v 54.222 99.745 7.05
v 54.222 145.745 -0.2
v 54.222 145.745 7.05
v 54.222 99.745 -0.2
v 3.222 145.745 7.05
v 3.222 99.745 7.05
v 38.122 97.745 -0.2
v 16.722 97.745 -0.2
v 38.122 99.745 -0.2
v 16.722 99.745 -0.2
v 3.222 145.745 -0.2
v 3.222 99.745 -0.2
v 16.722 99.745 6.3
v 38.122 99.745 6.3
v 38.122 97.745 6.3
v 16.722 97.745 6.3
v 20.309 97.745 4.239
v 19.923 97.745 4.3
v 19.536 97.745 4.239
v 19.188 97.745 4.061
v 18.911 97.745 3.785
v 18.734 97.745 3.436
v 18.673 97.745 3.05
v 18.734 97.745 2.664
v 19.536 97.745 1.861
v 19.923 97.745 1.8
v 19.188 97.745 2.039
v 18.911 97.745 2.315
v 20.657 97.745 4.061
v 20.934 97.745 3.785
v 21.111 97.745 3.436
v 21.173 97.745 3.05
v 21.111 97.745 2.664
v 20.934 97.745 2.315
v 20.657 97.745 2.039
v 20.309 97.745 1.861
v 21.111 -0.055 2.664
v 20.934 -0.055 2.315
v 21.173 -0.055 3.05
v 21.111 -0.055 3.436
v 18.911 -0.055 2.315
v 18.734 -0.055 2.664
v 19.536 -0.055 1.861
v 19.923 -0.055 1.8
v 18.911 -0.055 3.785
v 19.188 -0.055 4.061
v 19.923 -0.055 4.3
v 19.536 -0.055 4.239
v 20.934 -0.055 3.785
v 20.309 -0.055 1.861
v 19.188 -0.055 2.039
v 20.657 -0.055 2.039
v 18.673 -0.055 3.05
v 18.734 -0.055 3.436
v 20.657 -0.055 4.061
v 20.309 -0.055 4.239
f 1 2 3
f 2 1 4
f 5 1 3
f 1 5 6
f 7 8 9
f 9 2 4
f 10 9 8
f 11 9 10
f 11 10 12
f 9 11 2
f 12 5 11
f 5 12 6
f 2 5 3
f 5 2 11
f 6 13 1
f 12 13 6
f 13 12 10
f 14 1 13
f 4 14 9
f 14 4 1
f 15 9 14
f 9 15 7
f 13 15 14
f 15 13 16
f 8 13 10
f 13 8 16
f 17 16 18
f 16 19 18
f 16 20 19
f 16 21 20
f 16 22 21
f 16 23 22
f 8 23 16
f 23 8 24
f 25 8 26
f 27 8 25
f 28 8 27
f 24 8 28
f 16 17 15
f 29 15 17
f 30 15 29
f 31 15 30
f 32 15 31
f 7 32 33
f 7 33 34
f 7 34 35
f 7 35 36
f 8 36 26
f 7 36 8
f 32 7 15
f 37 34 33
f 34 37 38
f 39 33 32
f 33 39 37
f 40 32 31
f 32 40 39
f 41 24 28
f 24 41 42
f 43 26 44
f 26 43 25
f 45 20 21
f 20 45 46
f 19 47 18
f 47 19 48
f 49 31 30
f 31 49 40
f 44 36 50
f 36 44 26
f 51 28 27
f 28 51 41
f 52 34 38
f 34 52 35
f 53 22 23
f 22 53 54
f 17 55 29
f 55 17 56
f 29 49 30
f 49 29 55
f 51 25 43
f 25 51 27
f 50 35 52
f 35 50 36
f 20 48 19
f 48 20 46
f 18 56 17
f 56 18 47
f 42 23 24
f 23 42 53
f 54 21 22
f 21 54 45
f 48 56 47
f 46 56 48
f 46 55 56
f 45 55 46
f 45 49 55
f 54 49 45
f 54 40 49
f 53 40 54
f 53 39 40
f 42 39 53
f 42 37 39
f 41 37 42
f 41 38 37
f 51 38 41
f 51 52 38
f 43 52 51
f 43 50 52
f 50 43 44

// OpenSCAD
$fn = 60;

board_w = 43.0;
board_h = 38.0;
board_clearance = 1.1; 

usb_in_y_original = 125.73;
rgb_in_y_original = 114.3;

// --- ORIGINAL STANDOFFS ---
orig_h1 = [13.46, 140.34]; 
orig_h2 = [50.55, 140.46]; 
orig_h3 = [50.42, 108.59]; 
orig_h4 = [13.46, 108.59]; 

board_center_x = (orig_h1[0] + orig_h2[0] + orig_h3[0] + orig_h4[0]) / 4;
board_center_y = (orig_h1[1] + orig_h2[1] + orig_h3[1] + orig_h4[1]) / 4;

// --- ADJUSTED STANDOFFS ---
h1 = [orig_h1[0] - 5.0, orig_h1[1]]; 
h2 = [orig_h2[0] - 1.0, orig_h2[1]]; 
h3 = [orig_h3[0] - 1.0, orig_h3[1]]; 
h4 = [orig_h4[0] - 5.0, orig_h4[1]]; 

case_width = board_w + board_clearance;
case_length = board_h + board_clearance;

front_extension = 5.0; 
case_min_x = board_center_x - (case_width / 2) - front_extension; 
case_max_x = board_center_x + (case_width / 2); 
case_min_y = board_center_y - (case_length / 2); 
case_max_y = board_center_y + (case_length / 2); 

wall_thickness = 1.5; 
base_thickness = 2.0; 
standoff_h = 2.5; 
nominal_standoff_h = 2.5; 
pcb_thickness = 1.6;

usb_center_below_pcb = 1.6; 
usb_z = base_thickness + nominal_standoff_h - usb_center_below_pcb; 
total_internal_height = nominal_standoff_h + pcb_thickness; 

// Flip coordinates to match the mirrored standoffs
usb_in_y_flipped = board_center_y - (usb_in_y_original - board_center_y);
rgb_in_y_flipped = board_center_y - (rgb_in_y_original - board_center_y);

// LED sits on the downward-facing PCB. Center of a ~2mm LED is ~1mm below PCB surface.
rgb_z = base_thickness + nominal_standoff_h - 1.0; 

// --- FLEX TAB PARAMETERS ---
side_wall_t = 5.0;
tab_start_x = case_min_x + 12.0;
tab_l = 20.0;
slit_w = 1.0;
tab_protrusion = 2.0;

module pill(w, h, depth) {
    r = h/2;
    hull() {
        translate([-(w/2 - r), 0, 0]) cylinder(r=r, h=depth, center=true);
        translate([ (w/2 - r), 0, 0]) cylinder(r=r, h=depth, center=true);
    }
}

module standoff(pos) {
    translate([pos[0], pos[1], base_thickness])
    difference() {
        cylinder(d=5.5, h=standoff_h); 
        translate([0,0,1]) cylinder(d=2.0, h=standoff_h); 
    }
}

module slide_in_tray_upside_down() {
    union() {
        difference() {
            // Original outer bounding box
            translate([case_min_x - wall_thickness, case_min_y - side_wall_t, 0])
                cube([case_width + front_extension + wall_thickness, case_length + side_wall_t + wall_thickness, total_internal_height + base_thickness]);
            
            // Inner cavity: shortened by wall_thickness to leave a solid back wall
            translate([case_min_x, case_min_y, base_thickness])
                cube([case_width + front_extension - wall_thickness, case_length, total_internal_height + 1]);

            // --- BACK WALL MIDDLE 1/3RD CUTOUT ---
            translate([case_max_x - wall_thickness - 0.1, case_min_y + (case_length / 3), base_thickness])
                cube([wall_thickness + 0.2, case_length / 3, total_internal_height + 1]);

            // USB Cutout 
            translate([case_min_x, usb_in_y_flipped, usb_z]) 
                rotate([90, 0, -90]) 
                pill(9.0, 4.0, 20); 
                
            // RGB LED Cutout 
            translate([case_min_x, rgb_in_y_flipped, rgb_z]) 
                rotate([90, 0, -90]) 
                pill(4.0, 2.0, 20); 
                
            // --- FLEX TAB CAVITY ---
            translate([tab_start_x, case_min_y - side_wall_t + 1.8, -0.1])
                cube([tab_l + slit_w + 1, 2.0, total_internal_height + base_thickness + 0.2]);
                
            // --- FLEX TAB SLIT ---
            translate([tab_start_x, case_min_y - side_wall_t - 0.1, -0.1])
                cube([slit_w, 1.8 + 2.0 + 0.2, total_internal_height + base_thickness + 0.2]); 
        }
        
        // --- OUTWARD LOCKING TAB WEDGE ---
        translate([tab_start_x + slit_w, case_min_y - side_wall_t + 0.1, 0])
        linear_extrude(height=total_internal_height + base_thickness)
        polygon([
            [0, 0],                 
            [0, -tab_protrusion],   
            [4, -tab_protrusion],   
            [tab_l, 0]              
        ]);
        
        translate([0, board_center_y, 0])
        mirror([0, 1, 0])
        translate([0, -board_center_y, 0])
        union() {
            standoff(h1);
            standoff(h2);
            standoff(h3);
            standoff(h4);
        }
    }
}

module tray_outline(tolerance = 0.2) {
    translate([
        case_min_x - wall_thickness - tolerance, 
        case_min_y - side_wall_t - tolerance, 
        -tolerance
    ])
    cube([
        case_width + front_extension + wall_thickness + (tolerance * 2), 
        case_length + side_wall_t + wall_thickness + (tolerance * 2), 
        total_internal_height + base_thickness + (tolerance * 2) + 0.75
    ]);
}

module receiver_pocket_cutout(tolerance = 0.2) {
    tray_outline(tolerance);
    
    translate([
        tab_start_x - tolerance, 
        case_min_y - side_wall_t - tab_protrusion - tolerance, 
        -tolerance
    ])
    cube([
        tab_l + slit_w + (2*tolerance), 
        tab_protrusion + tolerance + 0.1, 
        total_internal_height + base_thickness + (2*tolerance)
    ]);
    
    translate([
        tab_start_x + slit_w + 2, 
        case_min_y - side_wall_t - 100, 
        (base_thickness + total_internal_height) / 2
    ])
    rotate([-90, 0, 0])
    cylinder(d=2.5, h=120, $fn=20);
}

// Render the completed tray
//slide_in_tray_upside_down();

// Uncomment the line below to view the negative shape you should subtract from the main case body
receiver_pocket_cutout(0.2);
